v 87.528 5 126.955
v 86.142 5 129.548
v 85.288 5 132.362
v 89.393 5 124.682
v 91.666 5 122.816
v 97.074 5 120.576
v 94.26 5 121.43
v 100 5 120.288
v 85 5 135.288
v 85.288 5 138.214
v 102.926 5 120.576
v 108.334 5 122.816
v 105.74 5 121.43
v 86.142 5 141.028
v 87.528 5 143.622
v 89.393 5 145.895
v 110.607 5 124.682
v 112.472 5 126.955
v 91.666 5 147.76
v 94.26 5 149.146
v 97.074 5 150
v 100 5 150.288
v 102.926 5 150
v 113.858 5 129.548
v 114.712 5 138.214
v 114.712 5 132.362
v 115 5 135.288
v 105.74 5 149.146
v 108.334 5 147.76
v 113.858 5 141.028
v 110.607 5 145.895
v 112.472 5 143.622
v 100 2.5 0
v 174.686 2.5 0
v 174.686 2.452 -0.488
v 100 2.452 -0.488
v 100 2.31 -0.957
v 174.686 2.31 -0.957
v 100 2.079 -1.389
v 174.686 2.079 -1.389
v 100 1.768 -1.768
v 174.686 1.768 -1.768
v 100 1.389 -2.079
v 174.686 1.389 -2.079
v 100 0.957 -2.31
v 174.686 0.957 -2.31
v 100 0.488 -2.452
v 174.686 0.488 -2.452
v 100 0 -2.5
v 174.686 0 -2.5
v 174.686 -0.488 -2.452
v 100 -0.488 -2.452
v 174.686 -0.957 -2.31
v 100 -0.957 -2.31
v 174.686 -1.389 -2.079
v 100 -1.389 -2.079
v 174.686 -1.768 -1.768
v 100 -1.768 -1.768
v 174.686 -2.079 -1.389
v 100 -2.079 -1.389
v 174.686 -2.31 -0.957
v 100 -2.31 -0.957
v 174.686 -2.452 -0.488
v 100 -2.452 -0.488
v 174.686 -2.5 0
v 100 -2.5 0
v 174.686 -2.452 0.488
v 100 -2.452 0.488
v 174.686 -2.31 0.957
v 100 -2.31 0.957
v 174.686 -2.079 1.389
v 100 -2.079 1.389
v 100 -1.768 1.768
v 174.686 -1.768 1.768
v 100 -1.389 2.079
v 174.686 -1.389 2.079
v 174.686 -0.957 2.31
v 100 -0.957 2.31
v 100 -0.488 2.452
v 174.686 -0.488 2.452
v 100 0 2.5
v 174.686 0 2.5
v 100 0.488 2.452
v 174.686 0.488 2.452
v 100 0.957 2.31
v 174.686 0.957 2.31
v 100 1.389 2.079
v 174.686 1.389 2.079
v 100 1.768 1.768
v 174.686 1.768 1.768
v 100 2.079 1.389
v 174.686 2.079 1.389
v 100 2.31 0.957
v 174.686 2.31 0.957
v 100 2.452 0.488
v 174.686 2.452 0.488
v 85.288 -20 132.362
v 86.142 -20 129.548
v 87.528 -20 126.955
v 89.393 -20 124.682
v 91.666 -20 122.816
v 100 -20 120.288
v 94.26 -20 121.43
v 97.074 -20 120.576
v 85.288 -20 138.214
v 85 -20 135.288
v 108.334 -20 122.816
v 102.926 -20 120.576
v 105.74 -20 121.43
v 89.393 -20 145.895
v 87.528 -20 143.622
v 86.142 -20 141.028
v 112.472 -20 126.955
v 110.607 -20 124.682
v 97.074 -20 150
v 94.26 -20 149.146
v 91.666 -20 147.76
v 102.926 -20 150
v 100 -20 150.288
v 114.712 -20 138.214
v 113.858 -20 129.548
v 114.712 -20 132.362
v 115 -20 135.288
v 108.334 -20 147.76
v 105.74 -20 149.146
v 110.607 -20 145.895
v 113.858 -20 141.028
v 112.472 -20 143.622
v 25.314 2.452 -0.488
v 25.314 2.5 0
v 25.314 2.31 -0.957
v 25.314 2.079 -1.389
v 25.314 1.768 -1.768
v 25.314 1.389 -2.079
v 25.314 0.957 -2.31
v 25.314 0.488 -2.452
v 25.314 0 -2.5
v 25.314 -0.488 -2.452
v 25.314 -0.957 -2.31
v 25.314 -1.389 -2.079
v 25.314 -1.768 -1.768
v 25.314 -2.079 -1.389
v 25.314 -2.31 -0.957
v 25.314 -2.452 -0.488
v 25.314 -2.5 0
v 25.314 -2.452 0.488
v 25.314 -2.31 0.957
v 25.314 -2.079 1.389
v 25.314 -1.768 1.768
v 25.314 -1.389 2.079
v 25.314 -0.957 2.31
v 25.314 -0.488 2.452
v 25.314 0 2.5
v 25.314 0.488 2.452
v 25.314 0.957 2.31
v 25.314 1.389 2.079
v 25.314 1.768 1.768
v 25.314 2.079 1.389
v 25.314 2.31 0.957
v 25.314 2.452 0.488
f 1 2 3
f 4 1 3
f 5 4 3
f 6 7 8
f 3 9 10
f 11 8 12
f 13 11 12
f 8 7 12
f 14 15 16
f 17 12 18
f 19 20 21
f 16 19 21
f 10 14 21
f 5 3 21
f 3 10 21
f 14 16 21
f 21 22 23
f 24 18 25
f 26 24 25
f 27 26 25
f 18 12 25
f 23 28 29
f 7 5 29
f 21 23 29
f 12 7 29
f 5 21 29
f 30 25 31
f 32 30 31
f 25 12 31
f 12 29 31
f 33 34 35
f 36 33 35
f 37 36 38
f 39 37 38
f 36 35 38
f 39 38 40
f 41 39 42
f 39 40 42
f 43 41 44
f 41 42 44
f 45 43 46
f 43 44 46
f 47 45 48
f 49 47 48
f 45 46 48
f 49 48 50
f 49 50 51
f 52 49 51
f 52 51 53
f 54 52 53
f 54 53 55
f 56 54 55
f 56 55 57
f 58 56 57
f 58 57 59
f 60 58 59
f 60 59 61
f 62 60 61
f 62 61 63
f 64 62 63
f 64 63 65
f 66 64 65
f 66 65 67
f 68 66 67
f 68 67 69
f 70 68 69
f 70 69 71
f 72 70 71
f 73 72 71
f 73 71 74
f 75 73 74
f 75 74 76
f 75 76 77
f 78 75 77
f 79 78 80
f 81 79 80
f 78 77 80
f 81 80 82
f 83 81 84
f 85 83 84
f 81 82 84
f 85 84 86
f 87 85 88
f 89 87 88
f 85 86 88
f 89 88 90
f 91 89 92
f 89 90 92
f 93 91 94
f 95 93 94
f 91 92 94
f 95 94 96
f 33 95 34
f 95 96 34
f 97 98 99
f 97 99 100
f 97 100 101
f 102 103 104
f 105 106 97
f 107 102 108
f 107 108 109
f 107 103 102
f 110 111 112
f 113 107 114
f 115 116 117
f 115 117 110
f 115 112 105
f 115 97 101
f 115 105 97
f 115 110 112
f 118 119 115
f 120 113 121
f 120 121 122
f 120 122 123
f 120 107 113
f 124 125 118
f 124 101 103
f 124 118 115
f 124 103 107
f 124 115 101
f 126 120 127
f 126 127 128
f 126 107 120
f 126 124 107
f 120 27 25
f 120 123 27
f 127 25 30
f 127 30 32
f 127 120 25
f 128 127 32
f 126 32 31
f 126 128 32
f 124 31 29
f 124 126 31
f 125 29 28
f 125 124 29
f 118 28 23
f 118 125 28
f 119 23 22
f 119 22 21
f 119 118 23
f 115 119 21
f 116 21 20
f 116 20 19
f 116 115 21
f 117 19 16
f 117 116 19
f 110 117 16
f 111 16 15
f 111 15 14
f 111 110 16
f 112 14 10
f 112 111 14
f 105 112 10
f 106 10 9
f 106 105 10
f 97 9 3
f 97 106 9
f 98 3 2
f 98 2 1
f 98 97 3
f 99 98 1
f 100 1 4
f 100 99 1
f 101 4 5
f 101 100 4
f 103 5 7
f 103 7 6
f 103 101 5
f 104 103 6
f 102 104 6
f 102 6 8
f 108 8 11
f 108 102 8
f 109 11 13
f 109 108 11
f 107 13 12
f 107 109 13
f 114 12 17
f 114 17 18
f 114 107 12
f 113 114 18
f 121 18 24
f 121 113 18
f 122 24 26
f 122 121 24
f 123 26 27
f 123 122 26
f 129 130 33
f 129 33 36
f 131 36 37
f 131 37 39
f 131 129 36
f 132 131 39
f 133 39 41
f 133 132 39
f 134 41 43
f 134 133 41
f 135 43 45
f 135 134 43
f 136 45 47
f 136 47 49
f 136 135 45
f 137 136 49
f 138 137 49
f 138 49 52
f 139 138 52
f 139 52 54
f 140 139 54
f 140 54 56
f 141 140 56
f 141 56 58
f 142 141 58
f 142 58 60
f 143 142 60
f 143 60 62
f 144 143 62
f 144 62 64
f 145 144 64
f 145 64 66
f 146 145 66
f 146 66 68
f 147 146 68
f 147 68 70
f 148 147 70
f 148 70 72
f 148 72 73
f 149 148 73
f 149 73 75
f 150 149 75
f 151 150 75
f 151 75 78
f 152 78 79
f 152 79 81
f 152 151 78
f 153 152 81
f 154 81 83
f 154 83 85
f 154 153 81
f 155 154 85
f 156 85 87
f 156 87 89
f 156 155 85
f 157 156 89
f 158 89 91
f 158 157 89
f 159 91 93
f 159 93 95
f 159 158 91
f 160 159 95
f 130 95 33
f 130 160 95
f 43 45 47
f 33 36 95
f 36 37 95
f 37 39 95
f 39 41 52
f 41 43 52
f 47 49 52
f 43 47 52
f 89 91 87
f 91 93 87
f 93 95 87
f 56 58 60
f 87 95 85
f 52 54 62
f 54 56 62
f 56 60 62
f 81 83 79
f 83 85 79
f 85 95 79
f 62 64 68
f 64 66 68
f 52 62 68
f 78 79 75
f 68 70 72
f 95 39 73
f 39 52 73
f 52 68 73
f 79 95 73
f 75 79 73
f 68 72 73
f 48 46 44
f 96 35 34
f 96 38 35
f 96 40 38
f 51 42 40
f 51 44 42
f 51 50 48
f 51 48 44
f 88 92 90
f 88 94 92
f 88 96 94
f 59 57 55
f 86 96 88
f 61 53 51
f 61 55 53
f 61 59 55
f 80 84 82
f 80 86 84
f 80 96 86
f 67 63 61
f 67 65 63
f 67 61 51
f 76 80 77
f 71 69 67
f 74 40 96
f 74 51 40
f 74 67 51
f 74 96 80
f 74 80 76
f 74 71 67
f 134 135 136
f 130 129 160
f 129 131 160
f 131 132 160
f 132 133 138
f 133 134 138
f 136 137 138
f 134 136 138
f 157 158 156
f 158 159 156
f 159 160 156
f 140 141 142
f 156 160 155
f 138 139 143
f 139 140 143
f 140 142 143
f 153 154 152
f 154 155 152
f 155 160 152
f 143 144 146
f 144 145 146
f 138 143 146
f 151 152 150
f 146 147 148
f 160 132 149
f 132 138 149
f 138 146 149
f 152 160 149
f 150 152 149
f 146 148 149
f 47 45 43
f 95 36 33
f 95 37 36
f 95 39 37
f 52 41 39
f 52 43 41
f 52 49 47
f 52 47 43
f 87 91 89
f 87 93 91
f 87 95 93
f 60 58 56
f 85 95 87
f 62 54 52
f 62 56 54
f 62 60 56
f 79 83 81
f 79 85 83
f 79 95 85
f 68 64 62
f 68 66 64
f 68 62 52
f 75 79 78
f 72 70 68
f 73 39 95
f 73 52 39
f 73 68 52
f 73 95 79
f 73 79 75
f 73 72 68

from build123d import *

# Parameters (mm, degrees)
F2_R      = 2.5
F7_R      = 15
F8_DEPTH  = 20
F9_R      = 15
F10_DEPTH = 5


# Not quite as in the source:
# - a pattern or mirror of a feature is missing from the dataset's text; its kind, count and spacing are read off the source's solid


with BuildPart() as f4:
    # F4: sweep along a path in F3
    with BuildLine(Plane.XZ) as f4_path:
        Line((100, 0), (25.3142239141, 0))
    # F2 (on plane+point) → F4 (sweep)
    with BuildSketch(Plane.YZ.offset(100)):
        Circle(F2_R)
    sweep(path=f4_path.line)


with BuildPart() as f4_copies_1:
    # F4_copies: instance of F4
    add(f4.part.mirror(Plane(origin=(100, 0, 0), x_dir=(0, 0, 1), z_dir=(1, 0, 0))))


with BuildPart() as f8:
    # F7 (on Front) → F8 (new body)
    with BuildSketch(Plane.XZ):
        with Locations((100, 135.2881040452)):
            Circle(F7_R)
    extrude(amount=F8_DEPTH)

    # F9 (on face) → F10 (join)
    with BuildSketch(Plane.XZ):
        with Locations((100, 135.2881040452)):
            Circle(F9_R)
    extrude(amount=-F10_DEPTH)


solid = Compound([f4.part, f4_copies_1.part, f8.part])
